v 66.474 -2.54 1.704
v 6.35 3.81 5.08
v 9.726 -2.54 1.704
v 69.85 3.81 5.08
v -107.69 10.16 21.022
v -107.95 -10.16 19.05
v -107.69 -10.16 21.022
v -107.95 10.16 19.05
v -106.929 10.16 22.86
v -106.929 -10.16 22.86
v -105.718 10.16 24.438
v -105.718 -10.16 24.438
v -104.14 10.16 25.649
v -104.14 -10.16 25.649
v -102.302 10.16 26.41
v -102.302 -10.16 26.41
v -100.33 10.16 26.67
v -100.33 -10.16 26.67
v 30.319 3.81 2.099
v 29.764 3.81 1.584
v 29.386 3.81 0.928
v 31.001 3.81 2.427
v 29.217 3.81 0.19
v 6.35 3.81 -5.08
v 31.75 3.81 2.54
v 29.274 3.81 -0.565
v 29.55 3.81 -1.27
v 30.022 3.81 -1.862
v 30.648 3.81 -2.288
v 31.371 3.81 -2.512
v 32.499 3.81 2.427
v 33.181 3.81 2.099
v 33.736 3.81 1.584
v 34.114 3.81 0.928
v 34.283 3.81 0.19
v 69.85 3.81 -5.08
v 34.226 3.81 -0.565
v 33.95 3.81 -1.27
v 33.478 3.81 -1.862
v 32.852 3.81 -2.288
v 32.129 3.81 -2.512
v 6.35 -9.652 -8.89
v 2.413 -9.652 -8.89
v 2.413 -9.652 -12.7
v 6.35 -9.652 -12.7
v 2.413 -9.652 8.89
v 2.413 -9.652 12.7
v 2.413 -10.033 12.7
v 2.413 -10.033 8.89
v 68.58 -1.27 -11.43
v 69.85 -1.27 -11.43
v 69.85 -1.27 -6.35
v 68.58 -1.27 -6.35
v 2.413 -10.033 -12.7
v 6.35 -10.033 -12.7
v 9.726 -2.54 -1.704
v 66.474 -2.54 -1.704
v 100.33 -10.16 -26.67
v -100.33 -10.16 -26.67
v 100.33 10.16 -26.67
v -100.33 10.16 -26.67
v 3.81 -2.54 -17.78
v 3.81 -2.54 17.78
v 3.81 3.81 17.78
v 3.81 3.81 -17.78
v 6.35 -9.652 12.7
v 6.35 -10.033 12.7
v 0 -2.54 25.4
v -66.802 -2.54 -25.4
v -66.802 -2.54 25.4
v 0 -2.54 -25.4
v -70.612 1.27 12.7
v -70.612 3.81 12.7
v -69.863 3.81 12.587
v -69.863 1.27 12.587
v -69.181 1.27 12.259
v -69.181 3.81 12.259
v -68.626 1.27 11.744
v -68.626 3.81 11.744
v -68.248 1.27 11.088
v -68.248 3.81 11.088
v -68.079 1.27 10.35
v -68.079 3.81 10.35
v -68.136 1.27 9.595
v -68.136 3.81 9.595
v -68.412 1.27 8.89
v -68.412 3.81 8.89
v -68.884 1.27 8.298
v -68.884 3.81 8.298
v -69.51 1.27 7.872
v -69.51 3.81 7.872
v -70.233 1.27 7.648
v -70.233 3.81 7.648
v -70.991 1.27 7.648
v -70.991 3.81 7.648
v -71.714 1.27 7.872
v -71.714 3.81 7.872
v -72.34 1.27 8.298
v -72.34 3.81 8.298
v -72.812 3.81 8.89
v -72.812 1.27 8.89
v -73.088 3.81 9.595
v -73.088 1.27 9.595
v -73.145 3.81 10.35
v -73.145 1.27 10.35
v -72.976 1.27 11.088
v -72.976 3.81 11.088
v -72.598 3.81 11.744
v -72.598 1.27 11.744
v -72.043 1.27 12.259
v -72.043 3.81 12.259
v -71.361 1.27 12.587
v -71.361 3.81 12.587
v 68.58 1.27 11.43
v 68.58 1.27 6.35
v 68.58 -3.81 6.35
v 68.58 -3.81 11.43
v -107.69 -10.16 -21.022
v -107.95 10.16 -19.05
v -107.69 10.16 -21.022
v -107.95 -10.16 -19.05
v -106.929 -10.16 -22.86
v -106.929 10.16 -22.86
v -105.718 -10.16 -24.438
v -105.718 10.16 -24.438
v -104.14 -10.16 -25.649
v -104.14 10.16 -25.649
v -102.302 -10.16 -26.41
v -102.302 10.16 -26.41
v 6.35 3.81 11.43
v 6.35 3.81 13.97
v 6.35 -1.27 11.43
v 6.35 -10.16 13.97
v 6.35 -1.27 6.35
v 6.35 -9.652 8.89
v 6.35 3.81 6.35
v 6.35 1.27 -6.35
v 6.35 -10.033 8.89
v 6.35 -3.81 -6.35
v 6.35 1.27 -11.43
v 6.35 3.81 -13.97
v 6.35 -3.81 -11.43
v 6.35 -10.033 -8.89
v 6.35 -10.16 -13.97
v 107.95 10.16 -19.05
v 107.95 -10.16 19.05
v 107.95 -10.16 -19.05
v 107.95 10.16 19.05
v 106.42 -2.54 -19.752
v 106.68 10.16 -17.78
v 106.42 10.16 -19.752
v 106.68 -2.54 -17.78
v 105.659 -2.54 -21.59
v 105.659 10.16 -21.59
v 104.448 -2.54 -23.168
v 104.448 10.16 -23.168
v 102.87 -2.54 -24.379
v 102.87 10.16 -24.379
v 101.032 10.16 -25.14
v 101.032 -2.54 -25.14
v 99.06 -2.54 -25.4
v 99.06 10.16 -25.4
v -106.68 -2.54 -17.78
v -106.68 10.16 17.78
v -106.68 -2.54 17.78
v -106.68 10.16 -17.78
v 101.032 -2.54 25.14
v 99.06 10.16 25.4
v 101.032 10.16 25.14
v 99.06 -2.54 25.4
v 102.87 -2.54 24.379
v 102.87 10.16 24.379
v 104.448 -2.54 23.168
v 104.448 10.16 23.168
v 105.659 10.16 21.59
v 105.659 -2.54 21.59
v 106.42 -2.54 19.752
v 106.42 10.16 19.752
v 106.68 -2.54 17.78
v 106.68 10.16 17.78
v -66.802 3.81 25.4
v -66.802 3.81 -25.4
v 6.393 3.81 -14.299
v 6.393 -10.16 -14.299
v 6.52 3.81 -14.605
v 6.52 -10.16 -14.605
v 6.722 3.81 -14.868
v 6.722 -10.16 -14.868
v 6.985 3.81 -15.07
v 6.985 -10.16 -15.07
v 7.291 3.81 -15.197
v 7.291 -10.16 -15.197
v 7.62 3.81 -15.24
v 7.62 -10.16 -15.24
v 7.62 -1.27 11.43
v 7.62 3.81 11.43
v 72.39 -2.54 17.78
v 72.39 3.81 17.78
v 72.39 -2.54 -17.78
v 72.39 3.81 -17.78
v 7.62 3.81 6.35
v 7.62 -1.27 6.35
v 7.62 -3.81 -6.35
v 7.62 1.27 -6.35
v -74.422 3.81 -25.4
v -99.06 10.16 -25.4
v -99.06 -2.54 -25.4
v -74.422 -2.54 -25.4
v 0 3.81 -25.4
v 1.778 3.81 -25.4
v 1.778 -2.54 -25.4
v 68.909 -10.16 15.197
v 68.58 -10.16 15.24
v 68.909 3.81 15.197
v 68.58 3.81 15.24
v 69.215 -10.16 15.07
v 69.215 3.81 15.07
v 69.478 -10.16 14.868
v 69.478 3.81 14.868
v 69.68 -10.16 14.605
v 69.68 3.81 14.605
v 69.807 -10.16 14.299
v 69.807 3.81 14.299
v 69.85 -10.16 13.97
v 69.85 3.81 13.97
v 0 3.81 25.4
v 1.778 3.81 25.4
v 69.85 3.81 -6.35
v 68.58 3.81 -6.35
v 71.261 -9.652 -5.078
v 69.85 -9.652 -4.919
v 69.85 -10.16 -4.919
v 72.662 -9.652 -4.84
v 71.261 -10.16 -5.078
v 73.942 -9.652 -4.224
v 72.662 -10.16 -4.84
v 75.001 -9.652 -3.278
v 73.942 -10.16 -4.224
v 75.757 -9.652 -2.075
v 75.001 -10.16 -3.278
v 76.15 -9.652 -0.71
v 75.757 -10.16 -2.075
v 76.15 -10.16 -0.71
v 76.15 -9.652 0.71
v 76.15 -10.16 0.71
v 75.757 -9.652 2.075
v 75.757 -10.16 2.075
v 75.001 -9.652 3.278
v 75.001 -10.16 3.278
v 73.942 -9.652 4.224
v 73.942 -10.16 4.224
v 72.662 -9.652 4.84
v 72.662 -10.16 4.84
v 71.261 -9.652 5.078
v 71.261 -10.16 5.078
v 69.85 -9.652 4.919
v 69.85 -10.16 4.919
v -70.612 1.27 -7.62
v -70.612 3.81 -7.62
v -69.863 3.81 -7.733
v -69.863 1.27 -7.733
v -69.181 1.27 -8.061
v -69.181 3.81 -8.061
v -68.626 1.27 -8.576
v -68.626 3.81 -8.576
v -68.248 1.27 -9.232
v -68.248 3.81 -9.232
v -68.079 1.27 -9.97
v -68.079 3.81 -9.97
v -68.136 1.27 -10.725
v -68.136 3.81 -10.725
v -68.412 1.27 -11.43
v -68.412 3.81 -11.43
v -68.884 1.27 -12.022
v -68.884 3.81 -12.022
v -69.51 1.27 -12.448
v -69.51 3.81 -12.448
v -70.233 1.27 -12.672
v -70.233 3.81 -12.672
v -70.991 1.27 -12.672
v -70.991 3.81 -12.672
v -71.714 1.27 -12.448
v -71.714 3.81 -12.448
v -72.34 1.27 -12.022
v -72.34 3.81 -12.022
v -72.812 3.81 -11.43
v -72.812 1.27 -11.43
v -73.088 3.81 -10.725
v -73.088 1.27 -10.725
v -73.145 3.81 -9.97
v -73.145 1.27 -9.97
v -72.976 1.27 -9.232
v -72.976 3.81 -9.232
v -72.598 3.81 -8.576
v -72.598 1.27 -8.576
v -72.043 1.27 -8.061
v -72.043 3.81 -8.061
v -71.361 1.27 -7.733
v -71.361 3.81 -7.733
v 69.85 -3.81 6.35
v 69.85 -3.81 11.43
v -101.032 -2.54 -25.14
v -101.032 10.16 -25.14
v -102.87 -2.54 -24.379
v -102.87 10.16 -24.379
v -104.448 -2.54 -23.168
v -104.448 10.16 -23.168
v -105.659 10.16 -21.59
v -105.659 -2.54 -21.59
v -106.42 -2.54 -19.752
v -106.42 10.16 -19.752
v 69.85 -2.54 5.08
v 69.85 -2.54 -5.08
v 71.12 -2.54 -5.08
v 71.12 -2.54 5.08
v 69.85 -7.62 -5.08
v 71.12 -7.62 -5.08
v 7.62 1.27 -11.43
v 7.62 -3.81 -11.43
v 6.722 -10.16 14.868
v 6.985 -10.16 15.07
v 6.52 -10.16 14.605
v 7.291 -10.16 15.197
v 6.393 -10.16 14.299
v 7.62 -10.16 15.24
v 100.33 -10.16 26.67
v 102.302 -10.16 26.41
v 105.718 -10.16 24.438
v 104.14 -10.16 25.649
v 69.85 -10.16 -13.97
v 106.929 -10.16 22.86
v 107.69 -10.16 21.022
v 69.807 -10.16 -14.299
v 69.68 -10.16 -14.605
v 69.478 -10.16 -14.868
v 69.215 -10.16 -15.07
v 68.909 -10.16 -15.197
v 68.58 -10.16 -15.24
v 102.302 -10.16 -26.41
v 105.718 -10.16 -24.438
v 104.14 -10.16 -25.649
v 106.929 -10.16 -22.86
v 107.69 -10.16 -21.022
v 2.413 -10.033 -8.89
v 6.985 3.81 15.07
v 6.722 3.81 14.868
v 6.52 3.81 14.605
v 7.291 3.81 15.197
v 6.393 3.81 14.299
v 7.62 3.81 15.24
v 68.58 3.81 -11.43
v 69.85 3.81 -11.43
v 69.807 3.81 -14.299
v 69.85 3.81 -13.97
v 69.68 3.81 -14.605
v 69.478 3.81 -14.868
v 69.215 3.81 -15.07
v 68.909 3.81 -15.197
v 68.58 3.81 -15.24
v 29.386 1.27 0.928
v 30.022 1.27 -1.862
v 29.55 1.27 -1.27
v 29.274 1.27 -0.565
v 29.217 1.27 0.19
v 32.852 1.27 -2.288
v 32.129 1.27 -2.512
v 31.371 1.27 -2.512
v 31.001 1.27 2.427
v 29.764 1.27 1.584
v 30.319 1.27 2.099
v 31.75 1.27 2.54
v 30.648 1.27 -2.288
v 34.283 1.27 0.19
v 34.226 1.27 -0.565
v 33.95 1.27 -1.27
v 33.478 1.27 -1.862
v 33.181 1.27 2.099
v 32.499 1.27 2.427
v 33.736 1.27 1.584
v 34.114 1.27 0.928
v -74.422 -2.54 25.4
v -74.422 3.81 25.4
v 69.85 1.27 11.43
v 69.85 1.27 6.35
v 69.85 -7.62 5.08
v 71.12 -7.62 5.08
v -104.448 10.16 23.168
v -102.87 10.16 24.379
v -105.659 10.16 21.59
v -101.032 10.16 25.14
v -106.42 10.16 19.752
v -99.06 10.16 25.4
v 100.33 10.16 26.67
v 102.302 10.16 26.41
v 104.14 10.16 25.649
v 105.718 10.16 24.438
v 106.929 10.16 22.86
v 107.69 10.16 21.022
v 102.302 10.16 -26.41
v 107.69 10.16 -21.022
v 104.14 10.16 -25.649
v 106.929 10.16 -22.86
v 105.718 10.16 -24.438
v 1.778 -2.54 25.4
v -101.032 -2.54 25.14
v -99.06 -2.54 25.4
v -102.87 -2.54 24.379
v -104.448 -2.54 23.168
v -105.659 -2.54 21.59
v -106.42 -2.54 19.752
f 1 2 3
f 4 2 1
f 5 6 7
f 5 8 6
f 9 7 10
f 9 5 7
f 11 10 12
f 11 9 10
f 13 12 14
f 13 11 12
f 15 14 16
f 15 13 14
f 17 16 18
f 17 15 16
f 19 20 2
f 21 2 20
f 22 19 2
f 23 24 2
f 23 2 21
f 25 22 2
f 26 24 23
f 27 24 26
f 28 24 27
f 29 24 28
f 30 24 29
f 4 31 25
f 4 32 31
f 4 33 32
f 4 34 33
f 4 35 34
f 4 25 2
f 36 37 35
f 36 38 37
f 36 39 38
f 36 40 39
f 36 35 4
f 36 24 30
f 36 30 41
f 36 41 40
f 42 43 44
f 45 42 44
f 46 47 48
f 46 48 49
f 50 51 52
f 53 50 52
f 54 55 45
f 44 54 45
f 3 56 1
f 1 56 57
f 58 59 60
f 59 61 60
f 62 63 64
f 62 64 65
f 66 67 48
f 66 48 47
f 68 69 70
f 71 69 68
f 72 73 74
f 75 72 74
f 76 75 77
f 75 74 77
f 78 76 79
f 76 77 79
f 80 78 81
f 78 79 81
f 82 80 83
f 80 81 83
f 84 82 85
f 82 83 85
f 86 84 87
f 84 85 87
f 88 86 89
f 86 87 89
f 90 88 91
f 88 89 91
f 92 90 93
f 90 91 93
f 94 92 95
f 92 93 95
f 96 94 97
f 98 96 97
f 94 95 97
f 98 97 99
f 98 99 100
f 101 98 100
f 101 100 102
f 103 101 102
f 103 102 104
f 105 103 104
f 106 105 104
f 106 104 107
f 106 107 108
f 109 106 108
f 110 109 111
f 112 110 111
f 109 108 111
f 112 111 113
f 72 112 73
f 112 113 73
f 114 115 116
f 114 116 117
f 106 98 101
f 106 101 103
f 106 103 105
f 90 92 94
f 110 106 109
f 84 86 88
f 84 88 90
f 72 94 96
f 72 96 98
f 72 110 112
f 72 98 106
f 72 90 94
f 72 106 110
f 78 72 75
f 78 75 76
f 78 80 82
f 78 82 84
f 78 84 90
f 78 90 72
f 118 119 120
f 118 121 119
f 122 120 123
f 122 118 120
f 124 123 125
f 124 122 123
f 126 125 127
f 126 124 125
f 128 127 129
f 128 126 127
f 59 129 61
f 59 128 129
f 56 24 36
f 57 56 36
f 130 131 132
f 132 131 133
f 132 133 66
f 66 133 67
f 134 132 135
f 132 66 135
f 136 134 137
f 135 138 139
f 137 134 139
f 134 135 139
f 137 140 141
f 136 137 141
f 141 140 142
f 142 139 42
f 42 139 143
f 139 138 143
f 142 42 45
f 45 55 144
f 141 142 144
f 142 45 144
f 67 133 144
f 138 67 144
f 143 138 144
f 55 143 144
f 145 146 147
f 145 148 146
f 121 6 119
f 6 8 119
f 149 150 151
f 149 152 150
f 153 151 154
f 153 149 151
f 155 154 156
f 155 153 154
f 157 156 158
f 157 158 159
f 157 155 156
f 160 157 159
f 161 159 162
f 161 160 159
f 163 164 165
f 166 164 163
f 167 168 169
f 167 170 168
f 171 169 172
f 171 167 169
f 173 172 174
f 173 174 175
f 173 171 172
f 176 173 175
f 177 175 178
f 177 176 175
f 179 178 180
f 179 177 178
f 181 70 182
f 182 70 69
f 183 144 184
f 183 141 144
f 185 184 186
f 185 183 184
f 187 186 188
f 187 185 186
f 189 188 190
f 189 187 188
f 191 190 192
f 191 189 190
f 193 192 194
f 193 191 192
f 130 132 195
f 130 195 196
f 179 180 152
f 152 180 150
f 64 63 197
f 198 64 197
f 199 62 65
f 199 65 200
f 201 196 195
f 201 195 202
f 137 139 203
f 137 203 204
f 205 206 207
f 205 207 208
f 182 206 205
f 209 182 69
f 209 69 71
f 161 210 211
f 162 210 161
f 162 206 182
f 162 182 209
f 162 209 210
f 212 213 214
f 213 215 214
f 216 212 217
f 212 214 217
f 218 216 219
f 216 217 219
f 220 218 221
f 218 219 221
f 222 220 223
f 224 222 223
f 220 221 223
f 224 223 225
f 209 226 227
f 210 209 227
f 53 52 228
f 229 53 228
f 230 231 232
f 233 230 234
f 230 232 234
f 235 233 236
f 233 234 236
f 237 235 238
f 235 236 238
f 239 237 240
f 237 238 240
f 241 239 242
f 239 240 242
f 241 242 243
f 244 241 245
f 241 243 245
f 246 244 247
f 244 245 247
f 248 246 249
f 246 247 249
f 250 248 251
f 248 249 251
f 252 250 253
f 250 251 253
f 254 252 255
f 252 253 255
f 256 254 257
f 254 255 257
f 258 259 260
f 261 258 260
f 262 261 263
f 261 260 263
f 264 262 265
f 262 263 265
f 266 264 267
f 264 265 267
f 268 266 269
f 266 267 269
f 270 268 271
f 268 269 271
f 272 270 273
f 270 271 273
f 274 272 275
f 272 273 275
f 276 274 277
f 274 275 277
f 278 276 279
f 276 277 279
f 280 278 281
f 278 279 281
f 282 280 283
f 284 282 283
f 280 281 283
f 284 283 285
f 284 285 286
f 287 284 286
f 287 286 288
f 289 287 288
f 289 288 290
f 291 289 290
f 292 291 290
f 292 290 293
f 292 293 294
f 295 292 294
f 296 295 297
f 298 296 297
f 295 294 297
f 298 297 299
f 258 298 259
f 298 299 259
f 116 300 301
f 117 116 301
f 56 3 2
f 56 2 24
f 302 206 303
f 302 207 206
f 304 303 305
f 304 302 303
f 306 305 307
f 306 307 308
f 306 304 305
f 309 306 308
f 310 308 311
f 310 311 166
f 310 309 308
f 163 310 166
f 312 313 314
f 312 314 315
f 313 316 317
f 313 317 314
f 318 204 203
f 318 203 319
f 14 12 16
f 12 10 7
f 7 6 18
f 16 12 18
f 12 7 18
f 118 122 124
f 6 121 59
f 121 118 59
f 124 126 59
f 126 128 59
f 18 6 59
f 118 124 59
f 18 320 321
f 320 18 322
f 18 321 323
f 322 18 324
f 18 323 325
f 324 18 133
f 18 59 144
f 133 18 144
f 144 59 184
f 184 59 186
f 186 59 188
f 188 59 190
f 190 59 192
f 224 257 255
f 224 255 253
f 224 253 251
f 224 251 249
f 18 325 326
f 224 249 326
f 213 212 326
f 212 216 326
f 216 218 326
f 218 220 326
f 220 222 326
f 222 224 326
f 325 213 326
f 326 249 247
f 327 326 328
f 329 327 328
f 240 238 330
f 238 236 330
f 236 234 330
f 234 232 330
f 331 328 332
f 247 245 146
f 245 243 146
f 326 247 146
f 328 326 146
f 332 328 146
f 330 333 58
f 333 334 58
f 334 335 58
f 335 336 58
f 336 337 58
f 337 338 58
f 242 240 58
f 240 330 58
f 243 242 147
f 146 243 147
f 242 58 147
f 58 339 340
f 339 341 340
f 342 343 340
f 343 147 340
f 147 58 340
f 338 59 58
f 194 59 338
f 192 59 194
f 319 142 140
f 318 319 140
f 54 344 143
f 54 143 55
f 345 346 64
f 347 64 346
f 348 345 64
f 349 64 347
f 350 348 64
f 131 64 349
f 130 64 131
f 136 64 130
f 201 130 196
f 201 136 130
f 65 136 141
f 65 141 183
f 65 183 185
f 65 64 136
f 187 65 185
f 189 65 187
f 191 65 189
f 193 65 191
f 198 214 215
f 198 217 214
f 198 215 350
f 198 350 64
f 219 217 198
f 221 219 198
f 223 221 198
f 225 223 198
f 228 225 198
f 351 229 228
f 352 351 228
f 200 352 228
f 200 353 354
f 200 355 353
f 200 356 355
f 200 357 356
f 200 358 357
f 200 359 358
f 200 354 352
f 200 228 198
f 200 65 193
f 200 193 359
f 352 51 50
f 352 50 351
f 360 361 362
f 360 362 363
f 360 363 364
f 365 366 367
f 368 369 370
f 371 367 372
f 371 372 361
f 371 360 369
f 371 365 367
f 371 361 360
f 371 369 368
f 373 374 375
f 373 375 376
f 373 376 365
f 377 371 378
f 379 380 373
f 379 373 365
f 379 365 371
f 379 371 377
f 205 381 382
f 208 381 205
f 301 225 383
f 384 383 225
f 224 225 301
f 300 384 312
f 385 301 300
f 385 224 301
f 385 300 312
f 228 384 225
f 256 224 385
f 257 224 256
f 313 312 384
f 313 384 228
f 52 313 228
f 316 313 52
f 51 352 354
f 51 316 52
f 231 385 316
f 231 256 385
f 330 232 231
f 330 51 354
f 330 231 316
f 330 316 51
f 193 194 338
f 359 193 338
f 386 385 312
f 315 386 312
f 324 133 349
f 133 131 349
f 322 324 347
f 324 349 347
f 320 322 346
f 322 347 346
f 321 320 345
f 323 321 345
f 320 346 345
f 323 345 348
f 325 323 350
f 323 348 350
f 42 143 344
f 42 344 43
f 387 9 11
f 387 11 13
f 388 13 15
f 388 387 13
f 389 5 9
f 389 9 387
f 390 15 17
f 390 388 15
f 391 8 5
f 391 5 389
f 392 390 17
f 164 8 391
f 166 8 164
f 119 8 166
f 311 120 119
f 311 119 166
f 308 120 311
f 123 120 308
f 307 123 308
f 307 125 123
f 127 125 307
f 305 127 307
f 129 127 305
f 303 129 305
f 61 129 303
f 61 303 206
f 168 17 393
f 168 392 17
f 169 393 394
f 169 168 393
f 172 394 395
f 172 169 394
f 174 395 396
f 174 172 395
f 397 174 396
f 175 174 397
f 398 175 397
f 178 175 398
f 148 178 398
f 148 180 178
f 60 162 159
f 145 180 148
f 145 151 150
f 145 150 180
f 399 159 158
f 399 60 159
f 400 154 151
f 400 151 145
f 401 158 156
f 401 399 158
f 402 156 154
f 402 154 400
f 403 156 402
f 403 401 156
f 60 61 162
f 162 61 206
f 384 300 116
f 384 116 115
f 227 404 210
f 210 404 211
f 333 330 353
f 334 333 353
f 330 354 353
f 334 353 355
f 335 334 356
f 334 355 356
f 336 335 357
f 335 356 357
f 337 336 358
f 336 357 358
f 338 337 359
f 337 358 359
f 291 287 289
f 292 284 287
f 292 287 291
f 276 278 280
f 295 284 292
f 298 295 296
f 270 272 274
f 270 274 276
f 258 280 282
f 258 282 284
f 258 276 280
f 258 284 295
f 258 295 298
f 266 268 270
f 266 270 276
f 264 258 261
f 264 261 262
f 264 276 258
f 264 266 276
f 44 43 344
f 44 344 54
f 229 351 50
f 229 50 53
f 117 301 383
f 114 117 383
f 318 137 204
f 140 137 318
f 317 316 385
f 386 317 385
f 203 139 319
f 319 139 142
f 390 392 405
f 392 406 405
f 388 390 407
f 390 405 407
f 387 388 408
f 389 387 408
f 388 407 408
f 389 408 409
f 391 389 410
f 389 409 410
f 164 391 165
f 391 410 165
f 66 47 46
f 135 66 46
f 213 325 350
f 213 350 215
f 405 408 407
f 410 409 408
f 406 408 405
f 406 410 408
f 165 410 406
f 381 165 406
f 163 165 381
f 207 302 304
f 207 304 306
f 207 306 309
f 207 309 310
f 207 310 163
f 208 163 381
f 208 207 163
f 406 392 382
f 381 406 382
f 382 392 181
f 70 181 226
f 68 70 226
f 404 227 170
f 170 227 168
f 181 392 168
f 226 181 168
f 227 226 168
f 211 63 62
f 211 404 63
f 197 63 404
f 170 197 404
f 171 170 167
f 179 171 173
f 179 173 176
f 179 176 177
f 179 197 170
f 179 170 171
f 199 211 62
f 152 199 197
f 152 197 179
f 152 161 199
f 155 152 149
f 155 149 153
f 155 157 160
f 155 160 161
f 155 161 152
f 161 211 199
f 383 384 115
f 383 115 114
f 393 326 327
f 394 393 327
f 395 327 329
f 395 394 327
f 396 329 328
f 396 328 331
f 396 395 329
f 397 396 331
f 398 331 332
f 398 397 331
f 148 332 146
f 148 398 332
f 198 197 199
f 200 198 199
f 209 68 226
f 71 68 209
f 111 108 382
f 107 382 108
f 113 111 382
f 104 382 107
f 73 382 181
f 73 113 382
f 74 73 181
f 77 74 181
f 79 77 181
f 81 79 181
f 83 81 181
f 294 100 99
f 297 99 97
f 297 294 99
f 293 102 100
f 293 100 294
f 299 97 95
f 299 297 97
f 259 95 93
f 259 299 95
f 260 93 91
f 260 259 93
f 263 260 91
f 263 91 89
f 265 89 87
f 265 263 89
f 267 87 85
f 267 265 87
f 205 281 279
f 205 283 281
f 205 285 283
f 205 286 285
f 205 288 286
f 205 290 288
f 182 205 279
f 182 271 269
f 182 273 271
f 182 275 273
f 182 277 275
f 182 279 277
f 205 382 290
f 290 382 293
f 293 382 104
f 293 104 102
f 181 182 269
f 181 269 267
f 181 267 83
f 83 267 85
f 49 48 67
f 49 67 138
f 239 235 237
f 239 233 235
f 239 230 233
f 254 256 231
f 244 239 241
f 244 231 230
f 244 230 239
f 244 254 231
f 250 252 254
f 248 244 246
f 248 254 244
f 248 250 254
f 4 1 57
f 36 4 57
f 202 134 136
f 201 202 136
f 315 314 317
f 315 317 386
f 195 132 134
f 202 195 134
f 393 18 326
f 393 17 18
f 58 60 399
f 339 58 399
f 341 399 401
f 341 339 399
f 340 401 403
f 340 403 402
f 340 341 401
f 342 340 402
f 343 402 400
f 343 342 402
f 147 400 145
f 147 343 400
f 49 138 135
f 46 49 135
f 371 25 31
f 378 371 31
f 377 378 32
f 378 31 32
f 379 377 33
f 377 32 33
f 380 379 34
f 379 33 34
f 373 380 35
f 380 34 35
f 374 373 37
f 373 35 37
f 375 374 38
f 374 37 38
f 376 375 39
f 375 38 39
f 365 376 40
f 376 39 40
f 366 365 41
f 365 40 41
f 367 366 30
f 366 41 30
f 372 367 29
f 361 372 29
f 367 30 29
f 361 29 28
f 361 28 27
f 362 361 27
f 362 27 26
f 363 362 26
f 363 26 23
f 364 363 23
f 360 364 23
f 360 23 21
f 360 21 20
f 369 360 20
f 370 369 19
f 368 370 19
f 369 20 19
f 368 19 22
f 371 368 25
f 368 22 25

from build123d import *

# Parameters (mm, degrees)
SKETCH1_W               = 215.9
SKETCH1_H               = 53.34
BOSS_EXTRUDE1_DEPTH     = 10.16
SKETCH3_W               = 213.36
SKETCH3_H               = 50.8
CUT_EXTRUDE1_DEPTH      = 12.7
FILLET3_R               = 7.62
SKETCH4_W               = 7.62
SKETCH4_H               = 50.8
SKETCH4_W_2             = 1.778
BOSS_EXTRUDE2_DEPTH     = 6.35
SKETCH5_W               = 68.58
SKETCH5_H               = 35.56
BOSS_EXTRUDE3_DEPTH     = 6.35
CUT_EXTRUDE2_DEPTH      = 112.918637411
CUT_EXTRUDE2_DEPTH_BACK = 112.918637411
SKETCH9_W               = 63.5
SKETCH9_H               = 30.48
SKETCH10_W              = 63.5
SKETCH10_H              = 10.16
BOSS_EXTRUDE4_DEPTH     = 6.35
BOSS_EXTRUDE4_DRAFT     = -28
SKETCH11_W              = 5.08
SKETCH11_H              = 5.08
BOSS_EXTRUDE5_DEPTH     = 1.27
SKETCH13_W              = 5.08
SKETCH13_H              = 5.08
BOSS_EXTRUDE6_DEPTH     = 1.27
SKETCH16_W              = 10.16
SKETCH16_H              = 5.08
CUT_EXTRUDE3_DEPTH      = 1.27
FILLET4_R               = 1.27
SKETCH19_R              = 5.08
CUT_EXTRUDE5_DEPTH      = 0.508
SKETCH21_W              = 3.81
SKETCH21_H              = 0.381
CUT_EXTRUDE7_DEPTH      = 3.937
SKETCH24_R              = 2.54
CUT_EXTRUDE11_DEPTH     = 2.54
SKETCH25_R              = 2.54
CUT_EXTRUDE12_DEPTH     = 2.54


with BuildPart() as part:
    # Sketch1 → Boss-Extrude1 (new, symmetric)
    with BuildSketch(Plane(origin=(0, 0, 0), x_dir=(1, 0, 0), z_dir=(0, 1, 0))):
        Rectangle(SKETCH1_W, SKETCH1_H)
    extrude(amount=BOSS_EXTRUDE1_DEPTH, both=True)

    # Sketch3 → Cut-Extrude1 (cut)
    with BuildSketch(Plane(origin=(0, 10.16, 0), x_dir=(1, 0, 0), z_dir=(0, 1, 0))):
        Rectangle(SKETCH3_W, SKETCH3_H)
    extrude(amount=-CUT_EXTRUDE1_DEPTH, mode=Mode.SUBTRACT)

    # Fillet3
    fillet3_edges = [part.edges().sort_by_distance(p)[0] for p in [
        (106.68, 3.81, 25.4),
        (106.68, 3.81, -25.4),
        (-106.68, 3.81, 25.4),
        (-106.68, 3.81, -25.4),
        (-107.95, 0, 26.67),
        (107.95, 0, -26.67),
        (107.95, 0, 26.67),
        (-107.95, 0, -26.67),
    ]]
    fillet(fillet3_edges, radius=FILLET3_R)

    # Sketch4 → Boss-Extrude2 (add)
    with BuildSketch(Plane(origin=(0, -2.54, 0), x_dir=(1, 0, 0), z_dir=(0, 1, 0))):
        with Locations((-70.612, 0)):
            Rectangle(SKETCH4_W, SKETCH4_H)
        with Locations((0.889, 0)):
            Rectangle(SKETCH4_W_2, SKETCH4_H)
    extrude(amount=BOSS_EXTRUDE2_DEPTH)

    # Sketch5 → Boss-Extrude3 (add)
    with BuildSketch(Plane(origin=(0, -2.54, 0), x_dir=(1, 0, 0), z_dir=(0, 1, 0))):
        with Locations((38.1, 0)):
            Rectangle(SKETCH5_W, SKETCH5_H)
    extrude(amount=BOSS_EXTRUDE3_DEPTH)

    # Sketch9 → Cut-Extrude2 (cut, two sides: drawn at the far end of the back side and taken through both)
    with BuildSketch(Plane(origin=(0, -2.54, 0), x_dir=(1, 0, 0), z_dir=(0, 1, 0)).offset(-CUT_EXTRUDE2_DEPTH_BACK)):
        with Locations((38.1, 0)):
            Rectangle(SKETCH9_W, SKETCH9_H)
    extrude(amount=CUT_EXTRUDE2_DEPTH + CUT_EXTRUDE2_DEPTH_BACK, mode=Mode.SUBTRACT)

    # Sketch11 → Boss-Extrude5 (add)
    with BuildSketch(Plane(origin=(6.35, 0, 0), x_dir=(0, 0, -1), z_dir=(1, 0, 0))):
        with Locations((-8.89, 1.27)):
            Rectangle(SKETCH11_W, SKETCH11_H)
        with Locations((8.89, -1.27)):
            Rectangle(SKETCH11_W, SKETCH11_H)
    extrude(amount=BOSS_EXTRUDE5_DEPTH)

    # Sketch13 → Boss-Extrude6 (add)
    with BuildSketch(Plane.ZY.offset(-69.85)):
        with Locations((-8.89, 1.27)):
            Rectangle(SKETCH13_W, SKETCH13_H)
        with Locations((8.89, -1.27)):
            Rectangle(SKETCH13_W, SKETCH13_H)
    extrude(amount=BOSS_EXTRUDE6_DEPTH)

    # Sketch16 → Cut-Extrude3 (cut)
    with BuildSketch(Plane.ZY.offset(-69.85)):
        with Locations((0, -5.08)):
            Rectangle(SKETCH16_W, SKETCH16_H)
    extrude(amount=-CUT_EXTRUDE3_DEPTH, mode=Mode.SUBTRACT)

    # Fillet4
    fillet4_edges = [part.edges().sort_by_distance(p)[0] for p in [
        (69.85, -3.175, -15.24),
        (69.85, -3.175, 15.24),
        (6.35, -3.175, 15.24),
        (6.35, -3.175, -15.24),
    ]]
    fillet(fillet4_edges, radius=FILLET4_R)

    # Sketch19 → Cut-Extrude5 (cut)
    with BuildSketch(Plane.XZ.offset(10.16)):
        with Locations((71.12, 0)):
            Circle(SKETCH19_R)
    extrude(amount=-CUT_EXTRUDE5_DEPTH, mode=Mode.SUBTRACT)

    # Sketch21 → Cut-Extrude7 (cut)
    with BuildSketch(Plane(origin=(6.35, 0, 0), x_dir=(0, 0, -1), z_dir=(1, 0, 0))):
        with Locations((-10.795, -9.8425)):
            Rectangle(SKETCH21_W, SKETCH21_H)
        with Locations((10.795, -9.8425)):
            Rectangle(SKETCH21_W, SKETCH21_H)
    extrude(amount=-CUT_EXTRUDE7_DEPTH, mode=Mode.SUBTRACT)

    # Sketch24 → Cut-Extrude11 (cut)
    with BuildSketch(Plane(origin=(0, 3.81, 0), x_dir=(1, 0, 0), z_dir=(0, 1, 0))):
        with Locations((-70.612, -10.16)):
            Circle(SKETCH24_R)
        with Locations((-70.612, 10.16)):
            Circle(SKETCH24_R)
    extrude(amount=-CUT_EXTRUDE11_DEPTH, mode=Mode.SUBTRACT)


with BuildPart() as body_2:
    # Sketch10 → Boss-Extrude4 (with draft: the straight prism first)
    with BuildSketch(Plane(origin=(0, 3.81, 0), x_dir=(1, 0, 0), z_dir=(0, 1, 0))):
        with Locations((38.1, 0)):
            Rectangle(SKETCH10_W, SKETCH10_H)
    extrude(amount=-BOSS_EXTRUDE4_DEPTH)
    # Boss-Extrude4: the draft: its side faces are tilted about the plane it starts from
    boss_extrude4_sides = [body_2.faces().sort_by_distance(p)[0] for p in [
        (38.1, 0.635, 5.08),
        (69.85, 0.635, 0),
        (38.1, 0.635, -5.08),
        (6.35, 0.635, 0),
    ]]
    draft(boss_extrude4_sides, Plane(origin=(0, 3.81, 0), x_dir=(1, 0, 0), z_dir=(0, 1, 0)), BOSS_EXTRUDE4_DRAFT)

    # Sketch25 → Cut-Extrude12 (cut)
    with BuildSketch(Plane(origin=(0, 3.81, 0), x_dir=(1, 0, 0), z_dir=(0, 1, 0))):
        with Locations((31.75, 0)):
            Circle(SKETCH25_R)
    extrude(amount=-CUT_EXTRUDE12_DEPTH, mode=Mode.SUBTRACT)


solid = Compound([part.part, body_2.part])
